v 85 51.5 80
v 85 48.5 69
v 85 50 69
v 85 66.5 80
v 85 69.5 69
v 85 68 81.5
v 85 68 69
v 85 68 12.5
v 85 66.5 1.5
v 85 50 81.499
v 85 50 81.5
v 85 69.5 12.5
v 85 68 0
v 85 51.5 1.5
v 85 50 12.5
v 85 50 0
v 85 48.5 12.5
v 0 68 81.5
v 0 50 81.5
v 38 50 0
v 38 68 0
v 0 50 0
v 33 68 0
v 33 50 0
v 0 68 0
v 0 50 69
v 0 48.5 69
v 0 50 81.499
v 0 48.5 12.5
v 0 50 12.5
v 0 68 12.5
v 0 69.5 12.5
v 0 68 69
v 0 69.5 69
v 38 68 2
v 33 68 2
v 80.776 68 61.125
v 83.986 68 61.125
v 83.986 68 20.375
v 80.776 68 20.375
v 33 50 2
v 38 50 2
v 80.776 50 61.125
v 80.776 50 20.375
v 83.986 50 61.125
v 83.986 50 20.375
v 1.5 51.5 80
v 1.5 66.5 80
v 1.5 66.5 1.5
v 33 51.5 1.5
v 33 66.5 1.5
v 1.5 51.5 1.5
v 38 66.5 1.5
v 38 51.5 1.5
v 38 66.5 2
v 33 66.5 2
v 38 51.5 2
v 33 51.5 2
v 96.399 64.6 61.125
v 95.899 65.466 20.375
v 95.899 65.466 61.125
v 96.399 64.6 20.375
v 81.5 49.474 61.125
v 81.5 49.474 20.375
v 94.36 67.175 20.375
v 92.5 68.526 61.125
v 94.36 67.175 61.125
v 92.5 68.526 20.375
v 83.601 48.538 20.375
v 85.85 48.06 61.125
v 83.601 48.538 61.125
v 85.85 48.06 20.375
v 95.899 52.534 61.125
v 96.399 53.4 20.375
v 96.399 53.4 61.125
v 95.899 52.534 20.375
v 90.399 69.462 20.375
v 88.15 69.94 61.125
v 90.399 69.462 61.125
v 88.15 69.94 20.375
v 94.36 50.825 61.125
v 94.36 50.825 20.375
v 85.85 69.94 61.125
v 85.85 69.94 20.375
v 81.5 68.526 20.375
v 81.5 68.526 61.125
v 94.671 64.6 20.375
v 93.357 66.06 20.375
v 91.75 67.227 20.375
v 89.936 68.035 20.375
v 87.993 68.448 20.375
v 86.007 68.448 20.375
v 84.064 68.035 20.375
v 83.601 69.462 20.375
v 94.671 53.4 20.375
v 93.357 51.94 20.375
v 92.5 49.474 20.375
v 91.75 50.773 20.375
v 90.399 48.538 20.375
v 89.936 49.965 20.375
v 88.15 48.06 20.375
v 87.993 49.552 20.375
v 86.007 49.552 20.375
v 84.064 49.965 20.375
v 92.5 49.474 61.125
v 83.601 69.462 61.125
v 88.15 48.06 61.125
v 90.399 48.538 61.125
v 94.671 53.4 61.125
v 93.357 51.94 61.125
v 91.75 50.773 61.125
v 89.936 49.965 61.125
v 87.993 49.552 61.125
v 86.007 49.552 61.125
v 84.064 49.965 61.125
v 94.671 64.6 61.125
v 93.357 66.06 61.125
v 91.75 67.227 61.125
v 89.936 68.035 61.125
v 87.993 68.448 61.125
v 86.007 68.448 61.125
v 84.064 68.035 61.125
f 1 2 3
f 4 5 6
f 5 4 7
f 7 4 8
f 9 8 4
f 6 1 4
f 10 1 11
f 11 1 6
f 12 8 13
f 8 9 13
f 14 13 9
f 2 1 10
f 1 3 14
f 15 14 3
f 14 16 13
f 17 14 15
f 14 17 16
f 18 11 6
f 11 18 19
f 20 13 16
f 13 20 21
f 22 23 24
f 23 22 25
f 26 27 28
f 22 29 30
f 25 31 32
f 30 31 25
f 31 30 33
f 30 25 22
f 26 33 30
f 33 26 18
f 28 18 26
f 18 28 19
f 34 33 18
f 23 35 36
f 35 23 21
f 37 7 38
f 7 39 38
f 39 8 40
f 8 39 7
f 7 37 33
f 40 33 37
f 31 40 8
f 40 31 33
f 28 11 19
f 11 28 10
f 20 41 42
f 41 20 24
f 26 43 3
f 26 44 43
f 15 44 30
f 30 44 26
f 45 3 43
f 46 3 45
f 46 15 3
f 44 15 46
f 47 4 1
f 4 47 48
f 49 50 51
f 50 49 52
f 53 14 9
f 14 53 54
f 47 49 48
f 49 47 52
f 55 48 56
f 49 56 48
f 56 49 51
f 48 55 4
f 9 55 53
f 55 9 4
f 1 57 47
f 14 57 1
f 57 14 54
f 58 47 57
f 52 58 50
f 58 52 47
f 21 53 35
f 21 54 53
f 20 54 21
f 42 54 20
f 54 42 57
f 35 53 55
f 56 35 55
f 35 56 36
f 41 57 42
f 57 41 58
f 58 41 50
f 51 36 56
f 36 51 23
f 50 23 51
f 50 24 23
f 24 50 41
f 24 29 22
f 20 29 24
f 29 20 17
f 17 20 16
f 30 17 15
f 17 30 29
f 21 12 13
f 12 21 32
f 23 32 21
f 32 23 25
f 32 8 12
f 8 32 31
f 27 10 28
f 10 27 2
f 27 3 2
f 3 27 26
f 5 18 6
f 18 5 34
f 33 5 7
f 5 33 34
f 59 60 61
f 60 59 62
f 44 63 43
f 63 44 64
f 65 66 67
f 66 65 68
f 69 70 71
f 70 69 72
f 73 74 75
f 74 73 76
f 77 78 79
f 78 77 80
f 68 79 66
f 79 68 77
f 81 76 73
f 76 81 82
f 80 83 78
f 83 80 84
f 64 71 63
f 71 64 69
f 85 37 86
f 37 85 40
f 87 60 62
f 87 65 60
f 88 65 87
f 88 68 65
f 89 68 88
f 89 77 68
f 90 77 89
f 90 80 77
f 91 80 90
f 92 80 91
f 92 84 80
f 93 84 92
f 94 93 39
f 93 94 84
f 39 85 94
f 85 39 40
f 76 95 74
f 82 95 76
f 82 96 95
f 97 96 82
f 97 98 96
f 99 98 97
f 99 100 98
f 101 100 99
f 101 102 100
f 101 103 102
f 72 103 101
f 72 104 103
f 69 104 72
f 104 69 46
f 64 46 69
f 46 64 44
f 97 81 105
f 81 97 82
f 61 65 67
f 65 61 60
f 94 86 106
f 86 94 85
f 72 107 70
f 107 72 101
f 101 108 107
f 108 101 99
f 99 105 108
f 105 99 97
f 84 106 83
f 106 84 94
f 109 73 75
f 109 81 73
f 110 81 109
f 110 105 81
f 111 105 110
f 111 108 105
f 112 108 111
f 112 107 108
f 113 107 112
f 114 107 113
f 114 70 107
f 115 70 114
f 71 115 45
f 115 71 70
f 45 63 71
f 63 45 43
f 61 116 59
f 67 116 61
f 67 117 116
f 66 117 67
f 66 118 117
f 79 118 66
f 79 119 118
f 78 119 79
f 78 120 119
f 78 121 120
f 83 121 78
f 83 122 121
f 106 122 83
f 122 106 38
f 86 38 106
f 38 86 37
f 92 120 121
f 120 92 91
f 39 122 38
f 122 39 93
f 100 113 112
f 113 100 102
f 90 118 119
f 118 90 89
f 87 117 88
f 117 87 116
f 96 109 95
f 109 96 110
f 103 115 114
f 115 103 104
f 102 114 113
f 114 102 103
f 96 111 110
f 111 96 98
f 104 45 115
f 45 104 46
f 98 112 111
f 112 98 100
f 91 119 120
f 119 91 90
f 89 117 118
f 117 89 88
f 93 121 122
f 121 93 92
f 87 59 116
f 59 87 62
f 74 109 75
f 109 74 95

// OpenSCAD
include <./MCAD/3d_triangle.scad>
height = 85;
//width = 24.5;
width = 18;
depth = 81.5;
//cylinder_diam = 25;
cylinder_diam = 22;
side_depth = 12.50;
side_width = 21.50;
side_width_end = 18.50;
shelldepth = 1.5;
shellwidth = 1.5;

module body() {



//translate(v = [height-75,-shelldepth,0] )clip_stop(2,width,depth);
  difference() {
        difference() {
            cube(size = [height,width,depth] );
            translate( v=[shellwidth,shellwidth,shelldepth] ) {
                cube( size = [height+2,width-shellwidth*2,depth-shelldepth*2] );
            }
        }
        translate(v = [height-52,-shelldepth,-1] ) {
            cube( size = [5,width+2*shellwidth,3] );

        }
        
    }

   
}

module clip_stop(x,y,z){
difference(){
cube( size = [x,y+4,z+4] );
translate( v=[shellwidth,shellwidth+1,shelldepth] ) {
                cube( size = [height,width+shellwidth-1,depth-shelldepth] );
            }

}
}

module clip_sides(){
translate (v = [0,0,0])rotate(a=90, v=[0,90,0])rotate(a=180, v=[0,0,90])3dtri_draw([0,0,0],[side_depth,0,0],[side_depth,side_width-side_width_end-shellwidth,0],height);

translate (v = [0,width ,0])rotate(a=90, v=[0,90,0])3dtri_draw([0,0,0],[-side_depth,0,0],[-side_depth,side_width-side_width_end-shellwidth,0],height);

translate (v = [0,0.0001,depth])rotate(a=90, v=[0,90,0])rotate(a=180, v=[0,0,90])3dtri_draw([0,0,0],[-side_depth,0,0],[-side_depth,side_width-side_width_end-shellwidth,0],height);

translate (v = [0,width ,depth])rotate(a=90, v=[0,90,0])3dtri_draw([0,0,0],[side_depth,0,0],[side_depth,side_width-side_width_end-shellwidth,0],height);

}



module bullet_cylinder() {
    difference() {
        translate( v = [height+cylinder_diam/2-9,(width/2),0]) {
            cylinder_hold();
        }
        translate( v = [height+cylinder_diam/2-9,width/2,0]) {
            cylinder_nullspace();
        }
        translate(v= [height-cylinder_diam,(width-11.2)/2,0]) {
            cube(size=[60 ,11.2 , depth ]);
		}

translate(v= [height-cylinder_diam,0,0]) {
            cube(size=[cylinder_diam,width , depth ]);
		}
    }
}

module cylinder_nullspace() {
    cylinder( r = (cylinder_diam/2)-(shellwidth), h = depth, $fs=0.5 );
}

module cylinder_hold() {
    translate( v= [0,0,depth/4]) {
        cylinder( r = (cylinder_diam/2), h = depth/2, $fs=0.5 );
    }
}

module left(){
difference() {
    union() {
        body();
        clip_sides();
        bullet_cylinder();
    }
translate([0,width/2,-100])cube(size=[1000,1000,1000]);
}
}

module right(){
translate([0,50,0])difference() {
    union() {
        body();
        clip_sides();
        bullet_cylinder();
    }
//translate([0,-width/2,-100])cube(size=[1000,width,1000]);
}
}

right();
//left();
